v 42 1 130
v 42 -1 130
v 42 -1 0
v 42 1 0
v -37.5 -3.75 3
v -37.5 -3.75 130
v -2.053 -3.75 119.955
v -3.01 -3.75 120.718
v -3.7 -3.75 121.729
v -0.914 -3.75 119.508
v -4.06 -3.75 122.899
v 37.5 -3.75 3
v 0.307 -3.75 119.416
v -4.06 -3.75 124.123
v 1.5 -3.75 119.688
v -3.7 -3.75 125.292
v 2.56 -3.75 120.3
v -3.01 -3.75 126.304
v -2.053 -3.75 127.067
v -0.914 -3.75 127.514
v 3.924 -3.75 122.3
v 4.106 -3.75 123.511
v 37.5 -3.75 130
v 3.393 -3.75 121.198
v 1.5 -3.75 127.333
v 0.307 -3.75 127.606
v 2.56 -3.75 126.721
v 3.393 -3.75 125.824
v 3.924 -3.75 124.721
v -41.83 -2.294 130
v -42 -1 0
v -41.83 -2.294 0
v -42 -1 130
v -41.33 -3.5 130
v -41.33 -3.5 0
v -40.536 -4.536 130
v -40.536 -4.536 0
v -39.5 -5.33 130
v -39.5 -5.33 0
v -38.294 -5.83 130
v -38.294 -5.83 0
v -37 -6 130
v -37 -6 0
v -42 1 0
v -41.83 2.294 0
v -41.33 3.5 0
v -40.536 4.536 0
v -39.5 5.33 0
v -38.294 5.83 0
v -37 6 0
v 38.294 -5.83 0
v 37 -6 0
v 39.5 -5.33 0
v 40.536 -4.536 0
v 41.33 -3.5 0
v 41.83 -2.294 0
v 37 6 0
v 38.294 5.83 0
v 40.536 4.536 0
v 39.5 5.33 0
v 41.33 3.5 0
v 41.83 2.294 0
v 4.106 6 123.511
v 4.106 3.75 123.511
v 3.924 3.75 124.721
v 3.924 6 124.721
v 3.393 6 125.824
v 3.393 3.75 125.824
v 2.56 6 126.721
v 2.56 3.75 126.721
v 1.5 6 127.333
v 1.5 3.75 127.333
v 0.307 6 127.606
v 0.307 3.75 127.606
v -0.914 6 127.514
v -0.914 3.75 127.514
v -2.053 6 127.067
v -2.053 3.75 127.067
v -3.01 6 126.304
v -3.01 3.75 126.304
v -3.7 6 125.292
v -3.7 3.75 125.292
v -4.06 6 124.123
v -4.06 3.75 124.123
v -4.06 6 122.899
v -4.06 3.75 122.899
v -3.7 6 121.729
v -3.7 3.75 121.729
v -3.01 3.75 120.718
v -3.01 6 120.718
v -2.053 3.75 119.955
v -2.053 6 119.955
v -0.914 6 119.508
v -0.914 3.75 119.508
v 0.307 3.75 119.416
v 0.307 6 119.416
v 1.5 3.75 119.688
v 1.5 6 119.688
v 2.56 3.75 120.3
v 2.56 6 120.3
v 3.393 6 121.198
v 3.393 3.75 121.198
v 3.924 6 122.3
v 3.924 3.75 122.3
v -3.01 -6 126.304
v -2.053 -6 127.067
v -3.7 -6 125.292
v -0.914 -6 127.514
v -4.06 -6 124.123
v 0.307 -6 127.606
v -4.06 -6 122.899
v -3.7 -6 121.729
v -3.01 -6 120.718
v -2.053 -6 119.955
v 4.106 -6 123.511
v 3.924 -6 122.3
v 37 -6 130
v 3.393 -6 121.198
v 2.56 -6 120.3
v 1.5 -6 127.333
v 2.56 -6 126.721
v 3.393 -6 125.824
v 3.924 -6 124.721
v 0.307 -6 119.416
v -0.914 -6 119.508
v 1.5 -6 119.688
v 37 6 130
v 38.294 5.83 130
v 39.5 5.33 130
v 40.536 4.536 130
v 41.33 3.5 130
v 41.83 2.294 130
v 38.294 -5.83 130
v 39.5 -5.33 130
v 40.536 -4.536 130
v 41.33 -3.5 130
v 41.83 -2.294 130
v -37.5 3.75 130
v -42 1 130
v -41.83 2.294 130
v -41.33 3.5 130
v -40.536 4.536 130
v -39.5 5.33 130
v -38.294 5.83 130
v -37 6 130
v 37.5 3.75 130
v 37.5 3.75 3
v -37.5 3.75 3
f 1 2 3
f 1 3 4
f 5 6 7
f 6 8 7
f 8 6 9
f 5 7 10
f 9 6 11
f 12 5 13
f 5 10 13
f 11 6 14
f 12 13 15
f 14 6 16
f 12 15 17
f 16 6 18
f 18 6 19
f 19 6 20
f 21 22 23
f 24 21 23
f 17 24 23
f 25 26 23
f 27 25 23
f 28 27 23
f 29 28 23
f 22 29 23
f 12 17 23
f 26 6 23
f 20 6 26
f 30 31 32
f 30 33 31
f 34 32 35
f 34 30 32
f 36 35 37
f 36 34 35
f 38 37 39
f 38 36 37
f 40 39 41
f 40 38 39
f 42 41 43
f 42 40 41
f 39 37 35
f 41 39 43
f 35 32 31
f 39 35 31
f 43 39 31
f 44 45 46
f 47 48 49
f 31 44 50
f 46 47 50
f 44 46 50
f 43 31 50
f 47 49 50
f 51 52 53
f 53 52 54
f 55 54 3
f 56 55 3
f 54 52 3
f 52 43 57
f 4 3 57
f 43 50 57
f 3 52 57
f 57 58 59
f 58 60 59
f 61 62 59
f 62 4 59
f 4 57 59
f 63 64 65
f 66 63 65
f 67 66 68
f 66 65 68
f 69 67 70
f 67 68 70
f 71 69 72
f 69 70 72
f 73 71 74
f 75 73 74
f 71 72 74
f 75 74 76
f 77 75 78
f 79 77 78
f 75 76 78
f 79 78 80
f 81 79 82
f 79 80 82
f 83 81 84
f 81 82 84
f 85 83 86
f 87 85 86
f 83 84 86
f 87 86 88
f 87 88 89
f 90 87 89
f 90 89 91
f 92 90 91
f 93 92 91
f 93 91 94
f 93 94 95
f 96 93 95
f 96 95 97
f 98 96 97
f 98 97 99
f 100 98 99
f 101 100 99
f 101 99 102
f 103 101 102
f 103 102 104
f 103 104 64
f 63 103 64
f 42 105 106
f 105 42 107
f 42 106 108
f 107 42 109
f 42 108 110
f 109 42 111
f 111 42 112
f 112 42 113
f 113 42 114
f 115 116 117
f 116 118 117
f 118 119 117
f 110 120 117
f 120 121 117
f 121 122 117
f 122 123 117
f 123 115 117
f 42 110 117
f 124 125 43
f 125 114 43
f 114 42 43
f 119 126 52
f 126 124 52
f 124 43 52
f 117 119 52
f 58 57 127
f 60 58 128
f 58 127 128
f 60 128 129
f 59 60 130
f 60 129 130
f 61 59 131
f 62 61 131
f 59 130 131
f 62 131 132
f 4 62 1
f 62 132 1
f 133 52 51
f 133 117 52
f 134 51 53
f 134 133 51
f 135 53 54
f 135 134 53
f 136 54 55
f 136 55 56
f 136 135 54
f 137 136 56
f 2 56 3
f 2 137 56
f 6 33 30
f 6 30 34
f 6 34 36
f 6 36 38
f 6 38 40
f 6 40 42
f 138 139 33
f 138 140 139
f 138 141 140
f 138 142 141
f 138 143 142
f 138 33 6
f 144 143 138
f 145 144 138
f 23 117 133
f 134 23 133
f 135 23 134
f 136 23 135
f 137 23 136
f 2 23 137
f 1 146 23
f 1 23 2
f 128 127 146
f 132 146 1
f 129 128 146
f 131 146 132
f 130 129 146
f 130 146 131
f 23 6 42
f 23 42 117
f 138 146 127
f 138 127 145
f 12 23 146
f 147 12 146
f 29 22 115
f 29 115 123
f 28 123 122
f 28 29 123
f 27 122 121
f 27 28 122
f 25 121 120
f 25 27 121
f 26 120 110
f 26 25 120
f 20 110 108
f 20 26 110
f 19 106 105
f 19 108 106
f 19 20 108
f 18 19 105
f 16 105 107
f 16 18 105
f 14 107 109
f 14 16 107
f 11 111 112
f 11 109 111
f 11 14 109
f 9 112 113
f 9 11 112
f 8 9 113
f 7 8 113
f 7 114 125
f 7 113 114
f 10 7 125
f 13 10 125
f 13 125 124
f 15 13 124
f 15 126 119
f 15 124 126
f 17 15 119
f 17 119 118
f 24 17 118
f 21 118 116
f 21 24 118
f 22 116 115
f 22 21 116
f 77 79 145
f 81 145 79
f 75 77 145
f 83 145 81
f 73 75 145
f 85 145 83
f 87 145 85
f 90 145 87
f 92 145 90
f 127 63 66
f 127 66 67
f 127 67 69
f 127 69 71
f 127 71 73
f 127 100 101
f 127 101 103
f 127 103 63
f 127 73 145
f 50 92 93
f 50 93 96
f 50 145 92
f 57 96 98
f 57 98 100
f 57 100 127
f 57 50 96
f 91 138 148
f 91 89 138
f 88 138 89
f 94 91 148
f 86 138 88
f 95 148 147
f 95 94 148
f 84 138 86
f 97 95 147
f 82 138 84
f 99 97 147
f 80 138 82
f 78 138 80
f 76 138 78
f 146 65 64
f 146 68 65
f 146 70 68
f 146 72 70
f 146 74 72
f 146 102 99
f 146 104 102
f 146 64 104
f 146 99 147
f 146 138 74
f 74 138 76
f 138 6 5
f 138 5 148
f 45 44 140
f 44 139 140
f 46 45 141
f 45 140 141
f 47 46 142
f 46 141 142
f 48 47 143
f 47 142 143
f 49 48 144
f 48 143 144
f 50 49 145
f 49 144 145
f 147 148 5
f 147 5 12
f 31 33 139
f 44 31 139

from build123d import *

# Parameters (mm, degrees)
F0_W          = 84
F0_H          = 12
F1_DEPTH      = 130
F3_W          = 75
F3_H          = 7.5
F4_DEPTH      = 127
F5_R          = 5
F6_R          = 4.1062425904
F7_DEPTH      = 6.001
F7_DEPTH_BACK = 25


with BuildPart() as f1:
    # F0 (on Top) → F1 (new body)
    with BuildSketch(Plane.XY):
        Rectangle(F0_W, F0_H)
    extrude(amount=F1_DEPTH)

    # F3 (on offset) → F4 (cut)
    with BuildSketch(Plane.XY.offset(130)):
        Rectangle(F3_W, F3_H)
    extrude(amount=-F4_DEPTH, mode=Mode.SUBTRACT)

    # F5
    f5_edges = [f1.edges().sort_by_distance(p)[0] for p in [
        (42, -6, 65),
        (42, 6, 65),
        (-42, 6, 65),
        (-42, -6, 65),
    ]]
    fillet(f5_edges, radius=F5_R)

    # F6 (on Front) → F7 (cut, two sides)
    with BuildSketch(Plane.XZ) as f7_sk:
        with Locations((0, 123.5107928514)):
            Circle(F6_R)
    extrude(amount=-F7_DEPTH, mode=Mode.SUBTRACT)
    extrude(f7_sk.sketch, amount=F7_DEPTH_BACK, mode=Mode.SUBTRACT)


solid = f1.part
